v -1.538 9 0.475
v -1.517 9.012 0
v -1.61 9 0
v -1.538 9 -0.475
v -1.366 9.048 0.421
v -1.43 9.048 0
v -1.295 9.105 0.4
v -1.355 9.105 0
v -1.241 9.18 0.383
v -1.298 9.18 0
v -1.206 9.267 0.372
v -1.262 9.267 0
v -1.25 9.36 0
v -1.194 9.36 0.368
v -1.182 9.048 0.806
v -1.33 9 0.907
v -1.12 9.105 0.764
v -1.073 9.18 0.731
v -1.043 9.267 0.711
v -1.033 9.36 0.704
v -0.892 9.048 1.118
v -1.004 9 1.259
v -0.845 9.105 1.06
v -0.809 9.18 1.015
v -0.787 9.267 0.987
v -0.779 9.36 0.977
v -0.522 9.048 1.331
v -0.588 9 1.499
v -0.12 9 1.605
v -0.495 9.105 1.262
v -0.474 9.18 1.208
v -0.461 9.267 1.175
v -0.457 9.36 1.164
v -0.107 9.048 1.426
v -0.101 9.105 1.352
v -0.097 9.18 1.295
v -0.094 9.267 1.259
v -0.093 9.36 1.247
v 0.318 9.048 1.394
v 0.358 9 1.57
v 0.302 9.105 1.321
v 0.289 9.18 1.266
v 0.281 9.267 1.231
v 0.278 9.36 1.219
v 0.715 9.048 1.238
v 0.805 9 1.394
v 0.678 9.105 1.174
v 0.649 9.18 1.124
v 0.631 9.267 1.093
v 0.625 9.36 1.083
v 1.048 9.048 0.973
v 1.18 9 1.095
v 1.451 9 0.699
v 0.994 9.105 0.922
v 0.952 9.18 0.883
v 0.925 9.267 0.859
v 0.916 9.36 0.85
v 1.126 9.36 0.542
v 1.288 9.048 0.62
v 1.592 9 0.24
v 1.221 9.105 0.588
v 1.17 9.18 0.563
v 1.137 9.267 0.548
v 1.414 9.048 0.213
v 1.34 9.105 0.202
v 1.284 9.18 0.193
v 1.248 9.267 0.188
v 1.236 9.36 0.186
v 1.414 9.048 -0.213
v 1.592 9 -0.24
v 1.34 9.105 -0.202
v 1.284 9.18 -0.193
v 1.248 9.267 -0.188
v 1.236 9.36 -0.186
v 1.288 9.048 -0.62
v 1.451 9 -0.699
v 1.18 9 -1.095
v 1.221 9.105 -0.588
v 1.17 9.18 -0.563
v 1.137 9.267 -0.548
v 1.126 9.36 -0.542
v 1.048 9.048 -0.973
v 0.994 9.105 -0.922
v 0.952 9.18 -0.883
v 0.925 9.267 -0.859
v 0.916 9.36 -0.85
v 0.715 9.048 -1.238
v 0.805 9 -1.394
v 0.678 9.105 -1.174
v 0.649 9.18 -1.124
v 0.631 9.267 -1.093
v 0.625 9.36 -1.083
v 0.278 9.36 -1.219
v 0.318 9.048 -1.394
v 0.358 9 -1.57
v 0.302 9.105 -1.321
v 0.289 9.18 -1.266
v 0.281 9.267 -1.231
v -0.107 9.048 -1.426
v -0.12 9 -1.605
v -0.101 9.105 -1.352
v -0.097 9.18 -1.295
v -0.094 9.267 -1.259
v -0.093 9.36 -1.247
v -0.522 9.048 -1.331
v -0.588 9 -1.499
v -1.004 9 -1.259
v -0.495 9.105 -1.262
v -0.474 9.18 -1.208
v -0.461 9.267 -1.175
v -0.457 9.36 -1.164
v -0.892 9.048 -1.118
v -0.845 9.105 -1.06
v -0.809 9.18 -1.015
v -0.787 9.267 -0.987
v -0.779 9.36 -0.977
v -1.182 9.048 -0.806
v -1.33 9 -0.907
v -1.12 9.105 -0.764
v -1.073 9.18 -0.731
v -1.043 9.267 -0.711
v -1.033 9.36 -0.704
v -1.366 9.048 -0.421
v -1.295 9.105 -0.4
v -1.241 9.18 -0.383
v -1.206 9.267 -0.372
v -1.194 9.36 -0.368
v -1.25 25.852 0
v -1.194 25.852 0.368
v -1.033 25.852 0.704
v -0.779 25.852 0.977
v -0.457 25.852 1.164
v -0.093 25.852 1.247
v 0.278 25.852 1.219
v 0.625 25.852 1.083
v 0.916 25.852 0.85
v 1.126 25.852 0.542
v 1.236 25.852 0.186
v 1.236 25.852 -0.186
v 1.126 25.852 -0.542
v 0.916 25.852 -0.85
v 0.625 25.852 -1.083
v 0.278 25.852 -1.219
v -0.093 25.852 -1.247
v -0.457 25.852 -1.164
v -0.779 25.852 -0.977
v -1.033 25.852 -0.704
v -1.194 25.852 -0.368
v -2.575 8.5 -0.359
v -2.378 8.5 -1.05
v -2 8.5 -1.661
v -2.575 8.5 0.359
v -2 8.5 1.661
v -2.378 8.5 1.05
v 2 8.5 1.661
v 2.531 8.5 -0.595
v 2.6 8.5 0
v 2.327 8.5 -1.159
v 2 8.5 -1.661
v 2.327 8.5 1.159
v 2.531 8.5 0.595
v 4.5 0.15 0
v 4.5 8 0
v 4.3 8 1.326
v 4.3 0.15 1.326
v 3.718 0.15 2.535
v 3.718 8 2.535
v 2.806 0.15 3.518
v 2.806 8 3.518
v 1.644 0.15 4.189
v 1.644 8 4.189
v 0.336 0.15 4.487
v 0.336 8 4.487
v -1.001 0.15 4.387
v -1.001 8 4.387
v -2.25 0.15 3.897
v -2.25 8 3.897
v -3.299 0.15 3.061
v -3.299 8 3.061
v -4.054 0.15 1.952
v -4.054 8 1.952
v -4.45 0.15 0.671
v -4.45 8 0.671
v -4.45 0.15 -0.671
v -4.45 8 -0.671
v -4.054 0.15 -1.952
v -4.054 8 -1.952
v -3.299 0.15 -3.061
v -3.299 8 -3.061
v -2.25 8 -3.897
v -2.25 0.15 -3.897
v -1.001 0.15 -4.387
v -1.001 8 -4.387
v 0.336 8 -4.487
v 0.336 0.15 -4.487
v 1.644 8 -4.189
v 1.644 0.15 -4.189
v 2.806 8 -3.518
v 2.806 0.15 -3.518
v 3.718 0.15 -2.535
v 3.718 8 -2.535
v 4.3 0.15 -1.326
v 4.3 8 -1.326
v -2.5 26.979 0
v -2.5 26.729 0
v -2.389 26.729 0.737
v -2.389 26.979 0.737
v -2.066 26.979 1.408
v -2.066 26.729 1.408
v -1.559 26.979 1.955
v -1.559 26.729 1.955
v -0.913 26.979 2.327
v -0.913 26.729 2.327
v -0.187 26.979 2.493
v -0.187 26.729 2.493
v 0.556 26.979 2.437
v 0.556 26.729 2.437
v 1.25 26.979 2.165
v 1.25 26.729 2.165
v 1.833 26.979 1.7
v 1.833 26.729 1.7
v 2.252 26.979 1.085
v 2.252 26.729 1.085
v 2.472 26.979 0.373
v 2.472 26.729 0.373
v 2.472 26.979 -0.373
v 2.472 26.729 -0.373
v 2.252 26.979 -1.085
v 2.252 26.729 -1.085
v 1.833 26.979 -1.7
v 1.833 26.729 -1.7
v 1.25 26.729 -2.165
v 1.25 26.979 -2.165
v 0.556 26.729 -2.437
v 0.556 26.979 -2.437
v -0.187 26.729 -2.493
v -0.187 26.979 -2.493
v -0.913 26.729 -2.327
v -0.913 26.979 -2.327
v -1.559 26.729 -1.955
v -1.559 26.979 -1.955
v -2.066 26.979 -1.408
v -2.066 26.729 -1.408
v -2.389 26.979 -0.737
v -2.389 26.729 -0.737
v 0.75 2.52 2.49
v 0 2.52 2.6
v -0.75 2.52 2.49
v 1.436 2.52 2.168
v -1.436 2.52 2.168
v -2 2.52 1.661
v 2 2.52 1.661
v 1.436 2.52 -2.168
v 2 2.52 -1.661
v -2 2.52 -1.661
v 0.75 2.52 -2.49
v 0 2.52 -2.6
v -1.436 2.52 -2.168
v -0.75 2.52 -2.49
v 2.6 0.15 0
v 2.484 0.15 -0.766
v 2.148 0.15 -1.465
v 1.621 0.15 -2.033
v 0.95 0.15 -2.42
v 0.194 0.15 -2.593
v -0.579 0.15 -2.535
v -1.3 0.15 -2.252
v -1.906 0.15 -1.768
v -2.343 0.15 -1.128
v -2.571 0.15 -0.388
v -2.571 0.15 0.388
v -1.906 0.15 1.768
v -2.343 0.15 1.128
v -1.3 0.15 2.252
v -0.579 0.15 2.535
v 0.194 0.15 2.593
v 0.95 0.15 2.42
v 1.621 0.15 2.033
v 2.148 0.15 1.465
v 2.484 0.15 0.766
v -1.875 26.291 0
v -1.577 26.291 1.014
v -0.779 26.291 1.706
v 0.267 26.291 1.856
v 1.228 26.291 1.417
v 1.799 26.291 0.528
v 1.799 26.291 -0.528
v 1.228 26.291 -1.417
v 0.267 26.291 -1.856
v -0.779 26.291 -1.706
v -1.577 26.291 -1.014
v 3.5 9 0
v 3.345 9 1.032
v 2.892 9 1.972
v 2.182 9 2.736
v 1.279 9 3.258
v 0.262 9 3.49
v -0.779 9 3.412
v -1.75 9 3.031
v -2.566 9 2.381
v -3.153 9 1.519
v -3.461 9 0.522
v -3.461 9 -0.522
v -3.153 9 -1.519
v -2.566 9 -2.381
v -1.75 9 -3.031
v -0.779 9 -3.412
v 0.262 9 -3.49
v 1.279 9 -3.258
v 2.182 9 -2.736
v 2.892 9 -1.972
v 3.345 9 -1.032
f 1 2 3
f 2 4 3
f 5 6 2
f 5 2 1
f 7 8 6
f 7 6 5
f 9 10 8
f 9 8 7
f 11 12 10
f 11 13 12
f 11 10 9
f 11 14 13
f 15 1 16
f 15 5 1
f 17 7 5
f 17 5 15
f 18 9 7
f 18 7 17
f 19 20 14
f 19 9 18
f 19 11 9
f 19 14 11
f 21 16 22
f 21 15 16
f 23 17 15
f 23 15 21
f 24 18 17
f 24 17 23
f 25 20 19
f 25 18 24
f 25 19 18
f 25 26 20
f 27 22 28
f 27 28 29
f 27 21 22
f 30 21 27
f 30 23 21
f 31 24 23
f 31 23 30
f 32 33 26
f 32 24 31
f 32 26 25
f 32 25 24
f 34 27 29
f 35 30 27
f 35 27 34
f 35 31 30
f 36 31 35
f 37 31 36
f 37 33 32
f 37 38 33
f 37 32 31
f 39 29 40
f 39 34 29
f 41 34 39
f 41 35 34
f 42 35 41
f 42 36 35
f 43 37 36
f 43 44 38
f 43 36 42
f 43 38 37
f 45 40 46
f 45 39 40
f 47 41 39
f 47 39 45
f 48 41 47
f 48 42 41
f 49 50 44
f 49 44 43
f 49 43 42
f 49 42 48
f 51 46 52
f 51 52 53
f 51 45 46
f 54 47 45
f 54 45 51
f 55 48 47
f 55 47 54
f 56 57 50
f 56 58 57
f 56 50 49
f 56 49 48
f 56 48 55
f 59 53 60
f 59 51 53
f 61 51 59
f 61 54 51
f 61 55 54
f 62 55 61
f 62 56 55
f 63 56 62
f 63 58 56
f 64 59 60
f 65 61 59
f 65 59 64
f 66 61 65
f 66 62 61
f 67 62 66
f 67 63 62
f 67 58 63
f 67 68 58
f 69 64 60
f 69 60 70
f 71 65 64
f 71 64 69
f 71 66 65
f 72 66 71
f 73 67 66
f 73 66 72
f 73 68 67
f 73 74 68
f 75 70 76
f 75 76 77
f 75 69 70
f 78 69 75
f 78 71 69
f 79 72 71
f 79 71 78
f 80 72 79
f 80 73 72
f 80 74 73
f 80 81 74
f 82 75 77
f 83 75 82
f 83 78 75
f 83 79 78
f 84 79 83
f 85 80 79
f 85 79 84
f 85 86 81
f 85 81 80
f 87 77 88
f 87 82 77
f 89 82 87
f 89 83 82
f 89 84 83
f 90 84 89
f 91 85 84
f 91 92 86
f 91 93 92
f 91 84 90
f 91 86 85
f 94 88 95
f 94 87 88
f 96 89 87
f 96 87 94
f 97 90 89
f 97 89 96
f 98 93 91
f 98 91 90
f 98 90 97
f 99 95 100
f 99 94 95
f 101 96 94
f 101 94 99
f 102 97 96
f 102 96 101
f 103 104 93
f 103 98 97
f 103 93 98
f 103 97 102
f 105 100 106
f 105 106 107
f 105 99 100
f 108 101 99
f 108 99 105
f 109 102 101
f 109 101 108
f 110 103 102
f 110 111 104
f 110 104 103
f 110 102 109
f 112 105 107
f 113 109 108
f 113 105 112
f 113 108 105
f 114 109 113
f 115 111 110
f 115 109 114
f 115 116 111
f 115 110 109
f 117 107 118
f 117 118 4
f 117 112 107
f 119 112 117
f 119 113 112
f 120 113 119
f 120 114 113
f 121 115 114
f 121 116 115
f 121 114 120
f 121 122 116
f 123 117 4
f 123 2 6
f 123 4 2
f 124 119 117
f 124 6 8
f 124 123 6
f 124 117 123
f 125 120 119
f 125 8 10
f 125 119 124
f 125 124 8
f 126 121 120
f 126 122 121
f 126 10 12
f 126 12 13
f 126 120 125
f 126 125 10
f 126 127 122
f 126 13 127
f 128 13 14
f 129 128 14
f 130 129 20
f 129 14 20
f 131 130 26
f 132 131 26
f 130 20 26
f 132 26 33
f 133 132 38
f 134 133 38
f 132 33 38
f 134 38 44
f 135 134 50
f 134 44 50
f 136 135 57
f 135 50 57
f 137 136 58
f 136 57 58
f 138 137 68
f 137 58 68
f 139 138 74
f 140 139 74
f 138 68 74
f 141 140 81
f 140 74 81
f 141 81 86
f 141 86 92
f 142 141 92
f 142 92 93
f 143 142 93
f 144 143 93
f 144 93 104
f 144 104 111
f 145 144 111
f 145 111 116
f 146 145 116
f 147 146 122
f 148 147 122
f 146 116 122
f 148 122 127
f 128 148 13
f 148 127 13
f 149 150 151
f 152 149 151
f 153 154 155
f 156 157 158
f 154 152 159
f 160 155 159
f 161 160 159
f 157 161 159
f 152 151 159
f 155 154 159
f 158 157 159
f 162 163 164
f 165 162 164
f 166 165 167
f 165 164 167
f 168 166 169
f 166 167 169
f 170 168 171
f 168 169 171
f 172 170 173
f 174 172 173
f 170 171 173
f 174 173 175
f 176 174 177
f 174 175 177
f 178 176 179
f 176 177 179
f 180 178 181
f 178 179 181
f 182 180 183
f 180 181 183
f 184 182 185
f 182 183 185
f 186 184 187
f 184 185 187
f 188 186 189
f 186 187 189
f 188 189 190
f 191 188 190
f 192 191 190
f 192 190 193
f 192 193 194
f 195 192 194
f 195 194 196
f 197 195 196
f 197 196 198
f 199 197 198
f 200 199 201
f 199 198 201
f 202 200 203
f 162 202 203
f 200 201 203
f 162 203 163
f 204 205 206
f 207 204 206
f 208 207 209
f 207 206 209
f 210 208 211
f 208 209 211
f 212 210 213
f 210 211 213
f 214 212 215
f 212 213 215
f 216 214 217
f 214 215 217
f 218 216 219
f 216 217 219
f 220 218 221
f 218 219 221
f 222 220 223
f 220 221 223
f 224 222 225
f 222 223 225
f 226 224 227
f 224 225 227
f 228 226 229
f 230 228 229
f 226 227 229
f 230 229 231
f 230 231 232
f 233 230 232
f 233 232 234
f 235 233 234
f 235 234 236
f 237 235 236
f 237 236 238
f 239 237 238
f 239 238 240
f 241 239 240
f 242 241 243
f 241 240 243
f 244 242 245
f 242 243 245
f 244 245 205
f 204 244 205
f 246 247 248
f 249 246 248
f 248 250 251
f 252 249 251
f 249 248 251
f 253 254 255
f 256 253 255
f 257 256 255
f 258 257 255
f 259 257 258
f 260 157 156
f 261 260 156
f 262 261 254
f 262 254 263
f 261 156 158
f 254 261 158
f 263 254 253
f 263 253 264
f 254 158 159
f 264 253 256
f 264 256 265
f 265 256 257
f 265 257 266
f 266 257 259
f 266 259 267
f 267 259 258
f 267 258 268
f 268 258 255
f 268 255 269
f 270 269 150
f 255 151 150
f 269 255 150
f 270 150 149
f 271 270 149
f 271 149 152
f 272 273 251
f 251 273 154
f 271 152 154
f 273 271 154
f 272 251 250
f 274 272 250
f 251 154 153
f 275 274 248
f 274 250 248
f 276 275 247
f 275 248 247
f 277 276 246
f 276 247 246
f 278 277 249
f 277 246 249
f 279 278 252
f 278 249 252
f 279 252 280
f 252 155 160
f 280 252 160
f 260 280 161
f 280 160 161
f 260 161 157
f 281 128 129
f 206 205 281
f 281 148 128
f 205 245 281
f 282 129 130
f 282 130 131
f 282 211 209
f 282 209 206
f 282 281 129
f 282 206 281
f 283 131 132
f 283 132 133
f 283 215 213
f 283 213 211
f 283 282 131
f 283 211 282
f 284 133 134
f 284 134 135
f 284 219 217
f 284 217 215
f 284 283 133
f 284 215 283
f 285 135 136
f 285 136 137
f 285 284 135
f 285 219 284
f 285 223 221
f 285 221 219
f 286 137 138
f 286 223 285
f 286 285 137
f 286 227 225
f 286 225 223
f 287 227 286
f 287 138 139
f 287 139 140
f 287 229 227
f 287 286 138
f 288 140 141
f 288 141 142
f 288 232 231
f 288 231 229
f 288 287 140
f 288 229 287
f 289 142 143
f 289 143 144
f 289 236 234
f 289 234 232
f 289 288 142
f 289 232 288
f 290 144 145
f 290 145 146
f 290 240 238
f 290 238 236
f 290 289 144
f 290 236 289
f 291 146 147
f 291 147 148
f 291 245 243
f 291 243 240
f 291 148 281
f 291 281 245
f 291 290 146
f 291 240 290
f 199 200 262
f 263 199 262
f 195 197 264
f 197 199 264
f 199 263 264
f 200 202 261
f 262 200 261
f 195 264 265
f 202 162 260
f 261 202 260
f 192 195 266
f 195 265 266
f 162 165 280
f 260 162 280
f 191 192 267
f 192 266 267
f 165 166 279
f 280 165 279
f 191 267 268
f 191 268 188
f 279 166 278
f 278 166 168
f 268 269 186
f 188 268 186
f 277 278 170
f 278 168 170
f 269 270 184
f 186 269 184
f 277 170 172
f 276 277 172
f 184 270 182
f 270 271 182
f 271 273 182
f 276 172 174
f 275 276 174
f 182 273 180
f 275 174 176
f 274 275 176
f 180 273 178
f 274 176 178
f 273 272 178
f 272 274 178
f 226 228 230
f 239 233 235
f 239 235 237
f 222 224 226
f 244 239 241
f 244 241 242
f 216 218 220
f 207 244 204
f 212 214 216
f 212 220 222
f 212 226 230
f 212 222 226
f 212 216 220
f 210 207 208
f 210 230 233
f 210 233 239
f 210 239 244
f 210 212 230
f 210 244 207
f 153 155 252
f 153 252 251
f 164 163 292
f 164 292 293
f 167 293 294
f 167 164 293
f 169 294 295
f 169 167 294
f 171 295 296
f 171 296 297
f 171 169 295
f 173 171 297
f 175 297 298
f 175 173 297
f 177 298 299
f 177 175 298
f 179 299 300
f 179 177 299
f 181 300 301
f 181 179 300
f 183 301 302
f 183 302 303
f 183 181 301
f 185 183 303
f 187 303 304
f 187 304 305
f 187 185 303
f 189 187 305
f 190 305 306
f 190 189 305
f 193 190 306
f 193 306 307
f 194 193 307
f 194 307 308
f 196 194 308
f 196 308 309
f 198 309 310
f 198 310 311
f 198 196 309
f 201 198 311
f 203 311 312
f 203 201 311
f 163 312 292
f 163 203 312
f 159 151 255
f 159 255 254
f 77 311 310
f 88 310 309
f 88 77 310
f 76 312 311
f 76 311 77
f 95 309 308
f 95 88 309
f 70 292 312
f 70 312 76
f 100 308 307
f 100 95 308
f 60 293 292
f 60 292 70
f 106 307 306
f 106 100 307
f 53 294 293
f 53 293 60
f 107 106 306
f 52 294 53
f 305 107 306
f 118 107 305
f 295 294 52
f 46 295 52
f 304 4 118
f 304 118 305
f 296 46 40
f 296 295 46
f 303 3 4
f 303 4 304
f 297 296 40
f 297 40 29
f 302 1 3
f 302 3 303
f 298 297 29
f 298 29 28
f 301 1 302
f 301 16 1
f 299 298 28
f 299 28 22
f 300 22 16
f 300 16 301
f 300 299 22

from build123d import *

# Parameters (mm, degrees)
SKETCH1_W                      = 4.5
SKETCH1_H                      = 8.85
F_5_2_5_2_DIAMETER_HOLE1_D     = 5.2
F_5_2_5_2_DIAMETER_HOLE1_DEPTH = 8.35
BOSS_EXTRUDE1_DEPTH            = 5.98
BOSS_EXTRUDE2_DEPTH            = 5.98
SKETCH6_R                      = 1.25
BOSS_EXTRUDE3_DEPTH            = 16.852002855
SKETCH7_R                      = 1.25
BOSS_EXTRUDE4_DEPTH            = 0.877097074
BOSS_EXTRUDE4_TAPER            = -54.943518707
SKETCH8_R                      = 2.5
BOSS_EXTRUDE5_DEPTH            = 0.25
CHAMFER1_SIZE                  = 1
FILLET1_R                      = 0.36


with BuildPart() as part:
    # Sketch1 → Revolve1 (revolve)
    with BuildSketch(Plane.XY):
        with Locations((2.25, 4.575)):
            Rectangle(SKETCH1_W, SKETCH1_H)
    revolve(axis=Axis((0, 9, 0), (0, -1, 0)))

    # Ø5.2 (5.2) Diameter Hole1
    with Locations(Plane(origin=(0, 0.15, 0), x_dir=(-1, 0, 0), z_dir=(0, -1, 0))):
        with Locations((0, 0)):
            Hole(F_5_2_5_2_DIAMETER_HOLE1_D / 2, depth=F_5_2_5_2_DIAMETER_HOLE1_DEPTH)

    # Sketch4 → Boss-Extrude1 (add)
    with BuildSketch(Plane.XZ.offset(-8.5)):
        with BuildLine():
            Line((-2, -1.661324773), (2, -1.661324773))
            ThreePointArc((2, -1.661324773), (0, -2.6), (-2, -1.661324773))
        make_face()
    extrude(amount=BOSS_EXTRUDE1_DEPTH)

    # Sketch5 → Boss-Extrude2 (add)
    with BuildSketch(Plane.XZ.offset(-8.5)):
        with BuildLine():
            Line((2, 1.661324773), (-2, 1.661324773))
            ThreePointArc((-2, 1.661324773), (0, 2.6), (2, 1.661324773))
        make_face()
    extrude(amount=BOSS_EXTRUDE2_DEPTH)

    # Sketch6 → Boss-Extrude3 (add)
    with BuildSketch(Plane(origin=(0, 9, 0), x_dir=(-1, 0, 0), z_dir=(0, 1, 0))):
        Circle(SKETCH6_R)
    extrude(amount=BOSS_EXTRUDE3_DEPTH)

    # Sketch7 → Boss-Extrude4 (add)
    with BuildSketch(Plane(origin=(0, 25.852002855, 0), x_dir=(-1, 0, 0), z_dir=(0, 1, 0))):
        Circle(SKETCH7_R)
    extrude(amount=BOSS_EXTRUDE4_DEPTH, taper=BOSS_EXTRUDE4_TAPER)

    # Sketch8 → Boss-Extrude5 (add)
    with BuildSketch(Plane(origin=(0, 26.729099929, 0), x_dir=(-1, 0, 0), z_dir=(0, 1, 0))):
        Circle(SKETCH8_R)
    extrude(amount=BOSS_EXTRUDE5_DEPTH)

    # Chamfer1
    chamfer1_edges = [part.edges().sort_by_distance(p)[0] for p in [
        (-4.5, 9, 0),
    ]]
    chamfer(chamfer1_edges, length=CHAMFER1_SIZE)

    # Fillet1
    fillet1_edges = [part.edges().sort_by_distance(p)[0] for p in [
        (1.25, 9, 0),
    ]]
    fillet(fillet1_edges, radius=FILLET1_R)


solid = part.part
